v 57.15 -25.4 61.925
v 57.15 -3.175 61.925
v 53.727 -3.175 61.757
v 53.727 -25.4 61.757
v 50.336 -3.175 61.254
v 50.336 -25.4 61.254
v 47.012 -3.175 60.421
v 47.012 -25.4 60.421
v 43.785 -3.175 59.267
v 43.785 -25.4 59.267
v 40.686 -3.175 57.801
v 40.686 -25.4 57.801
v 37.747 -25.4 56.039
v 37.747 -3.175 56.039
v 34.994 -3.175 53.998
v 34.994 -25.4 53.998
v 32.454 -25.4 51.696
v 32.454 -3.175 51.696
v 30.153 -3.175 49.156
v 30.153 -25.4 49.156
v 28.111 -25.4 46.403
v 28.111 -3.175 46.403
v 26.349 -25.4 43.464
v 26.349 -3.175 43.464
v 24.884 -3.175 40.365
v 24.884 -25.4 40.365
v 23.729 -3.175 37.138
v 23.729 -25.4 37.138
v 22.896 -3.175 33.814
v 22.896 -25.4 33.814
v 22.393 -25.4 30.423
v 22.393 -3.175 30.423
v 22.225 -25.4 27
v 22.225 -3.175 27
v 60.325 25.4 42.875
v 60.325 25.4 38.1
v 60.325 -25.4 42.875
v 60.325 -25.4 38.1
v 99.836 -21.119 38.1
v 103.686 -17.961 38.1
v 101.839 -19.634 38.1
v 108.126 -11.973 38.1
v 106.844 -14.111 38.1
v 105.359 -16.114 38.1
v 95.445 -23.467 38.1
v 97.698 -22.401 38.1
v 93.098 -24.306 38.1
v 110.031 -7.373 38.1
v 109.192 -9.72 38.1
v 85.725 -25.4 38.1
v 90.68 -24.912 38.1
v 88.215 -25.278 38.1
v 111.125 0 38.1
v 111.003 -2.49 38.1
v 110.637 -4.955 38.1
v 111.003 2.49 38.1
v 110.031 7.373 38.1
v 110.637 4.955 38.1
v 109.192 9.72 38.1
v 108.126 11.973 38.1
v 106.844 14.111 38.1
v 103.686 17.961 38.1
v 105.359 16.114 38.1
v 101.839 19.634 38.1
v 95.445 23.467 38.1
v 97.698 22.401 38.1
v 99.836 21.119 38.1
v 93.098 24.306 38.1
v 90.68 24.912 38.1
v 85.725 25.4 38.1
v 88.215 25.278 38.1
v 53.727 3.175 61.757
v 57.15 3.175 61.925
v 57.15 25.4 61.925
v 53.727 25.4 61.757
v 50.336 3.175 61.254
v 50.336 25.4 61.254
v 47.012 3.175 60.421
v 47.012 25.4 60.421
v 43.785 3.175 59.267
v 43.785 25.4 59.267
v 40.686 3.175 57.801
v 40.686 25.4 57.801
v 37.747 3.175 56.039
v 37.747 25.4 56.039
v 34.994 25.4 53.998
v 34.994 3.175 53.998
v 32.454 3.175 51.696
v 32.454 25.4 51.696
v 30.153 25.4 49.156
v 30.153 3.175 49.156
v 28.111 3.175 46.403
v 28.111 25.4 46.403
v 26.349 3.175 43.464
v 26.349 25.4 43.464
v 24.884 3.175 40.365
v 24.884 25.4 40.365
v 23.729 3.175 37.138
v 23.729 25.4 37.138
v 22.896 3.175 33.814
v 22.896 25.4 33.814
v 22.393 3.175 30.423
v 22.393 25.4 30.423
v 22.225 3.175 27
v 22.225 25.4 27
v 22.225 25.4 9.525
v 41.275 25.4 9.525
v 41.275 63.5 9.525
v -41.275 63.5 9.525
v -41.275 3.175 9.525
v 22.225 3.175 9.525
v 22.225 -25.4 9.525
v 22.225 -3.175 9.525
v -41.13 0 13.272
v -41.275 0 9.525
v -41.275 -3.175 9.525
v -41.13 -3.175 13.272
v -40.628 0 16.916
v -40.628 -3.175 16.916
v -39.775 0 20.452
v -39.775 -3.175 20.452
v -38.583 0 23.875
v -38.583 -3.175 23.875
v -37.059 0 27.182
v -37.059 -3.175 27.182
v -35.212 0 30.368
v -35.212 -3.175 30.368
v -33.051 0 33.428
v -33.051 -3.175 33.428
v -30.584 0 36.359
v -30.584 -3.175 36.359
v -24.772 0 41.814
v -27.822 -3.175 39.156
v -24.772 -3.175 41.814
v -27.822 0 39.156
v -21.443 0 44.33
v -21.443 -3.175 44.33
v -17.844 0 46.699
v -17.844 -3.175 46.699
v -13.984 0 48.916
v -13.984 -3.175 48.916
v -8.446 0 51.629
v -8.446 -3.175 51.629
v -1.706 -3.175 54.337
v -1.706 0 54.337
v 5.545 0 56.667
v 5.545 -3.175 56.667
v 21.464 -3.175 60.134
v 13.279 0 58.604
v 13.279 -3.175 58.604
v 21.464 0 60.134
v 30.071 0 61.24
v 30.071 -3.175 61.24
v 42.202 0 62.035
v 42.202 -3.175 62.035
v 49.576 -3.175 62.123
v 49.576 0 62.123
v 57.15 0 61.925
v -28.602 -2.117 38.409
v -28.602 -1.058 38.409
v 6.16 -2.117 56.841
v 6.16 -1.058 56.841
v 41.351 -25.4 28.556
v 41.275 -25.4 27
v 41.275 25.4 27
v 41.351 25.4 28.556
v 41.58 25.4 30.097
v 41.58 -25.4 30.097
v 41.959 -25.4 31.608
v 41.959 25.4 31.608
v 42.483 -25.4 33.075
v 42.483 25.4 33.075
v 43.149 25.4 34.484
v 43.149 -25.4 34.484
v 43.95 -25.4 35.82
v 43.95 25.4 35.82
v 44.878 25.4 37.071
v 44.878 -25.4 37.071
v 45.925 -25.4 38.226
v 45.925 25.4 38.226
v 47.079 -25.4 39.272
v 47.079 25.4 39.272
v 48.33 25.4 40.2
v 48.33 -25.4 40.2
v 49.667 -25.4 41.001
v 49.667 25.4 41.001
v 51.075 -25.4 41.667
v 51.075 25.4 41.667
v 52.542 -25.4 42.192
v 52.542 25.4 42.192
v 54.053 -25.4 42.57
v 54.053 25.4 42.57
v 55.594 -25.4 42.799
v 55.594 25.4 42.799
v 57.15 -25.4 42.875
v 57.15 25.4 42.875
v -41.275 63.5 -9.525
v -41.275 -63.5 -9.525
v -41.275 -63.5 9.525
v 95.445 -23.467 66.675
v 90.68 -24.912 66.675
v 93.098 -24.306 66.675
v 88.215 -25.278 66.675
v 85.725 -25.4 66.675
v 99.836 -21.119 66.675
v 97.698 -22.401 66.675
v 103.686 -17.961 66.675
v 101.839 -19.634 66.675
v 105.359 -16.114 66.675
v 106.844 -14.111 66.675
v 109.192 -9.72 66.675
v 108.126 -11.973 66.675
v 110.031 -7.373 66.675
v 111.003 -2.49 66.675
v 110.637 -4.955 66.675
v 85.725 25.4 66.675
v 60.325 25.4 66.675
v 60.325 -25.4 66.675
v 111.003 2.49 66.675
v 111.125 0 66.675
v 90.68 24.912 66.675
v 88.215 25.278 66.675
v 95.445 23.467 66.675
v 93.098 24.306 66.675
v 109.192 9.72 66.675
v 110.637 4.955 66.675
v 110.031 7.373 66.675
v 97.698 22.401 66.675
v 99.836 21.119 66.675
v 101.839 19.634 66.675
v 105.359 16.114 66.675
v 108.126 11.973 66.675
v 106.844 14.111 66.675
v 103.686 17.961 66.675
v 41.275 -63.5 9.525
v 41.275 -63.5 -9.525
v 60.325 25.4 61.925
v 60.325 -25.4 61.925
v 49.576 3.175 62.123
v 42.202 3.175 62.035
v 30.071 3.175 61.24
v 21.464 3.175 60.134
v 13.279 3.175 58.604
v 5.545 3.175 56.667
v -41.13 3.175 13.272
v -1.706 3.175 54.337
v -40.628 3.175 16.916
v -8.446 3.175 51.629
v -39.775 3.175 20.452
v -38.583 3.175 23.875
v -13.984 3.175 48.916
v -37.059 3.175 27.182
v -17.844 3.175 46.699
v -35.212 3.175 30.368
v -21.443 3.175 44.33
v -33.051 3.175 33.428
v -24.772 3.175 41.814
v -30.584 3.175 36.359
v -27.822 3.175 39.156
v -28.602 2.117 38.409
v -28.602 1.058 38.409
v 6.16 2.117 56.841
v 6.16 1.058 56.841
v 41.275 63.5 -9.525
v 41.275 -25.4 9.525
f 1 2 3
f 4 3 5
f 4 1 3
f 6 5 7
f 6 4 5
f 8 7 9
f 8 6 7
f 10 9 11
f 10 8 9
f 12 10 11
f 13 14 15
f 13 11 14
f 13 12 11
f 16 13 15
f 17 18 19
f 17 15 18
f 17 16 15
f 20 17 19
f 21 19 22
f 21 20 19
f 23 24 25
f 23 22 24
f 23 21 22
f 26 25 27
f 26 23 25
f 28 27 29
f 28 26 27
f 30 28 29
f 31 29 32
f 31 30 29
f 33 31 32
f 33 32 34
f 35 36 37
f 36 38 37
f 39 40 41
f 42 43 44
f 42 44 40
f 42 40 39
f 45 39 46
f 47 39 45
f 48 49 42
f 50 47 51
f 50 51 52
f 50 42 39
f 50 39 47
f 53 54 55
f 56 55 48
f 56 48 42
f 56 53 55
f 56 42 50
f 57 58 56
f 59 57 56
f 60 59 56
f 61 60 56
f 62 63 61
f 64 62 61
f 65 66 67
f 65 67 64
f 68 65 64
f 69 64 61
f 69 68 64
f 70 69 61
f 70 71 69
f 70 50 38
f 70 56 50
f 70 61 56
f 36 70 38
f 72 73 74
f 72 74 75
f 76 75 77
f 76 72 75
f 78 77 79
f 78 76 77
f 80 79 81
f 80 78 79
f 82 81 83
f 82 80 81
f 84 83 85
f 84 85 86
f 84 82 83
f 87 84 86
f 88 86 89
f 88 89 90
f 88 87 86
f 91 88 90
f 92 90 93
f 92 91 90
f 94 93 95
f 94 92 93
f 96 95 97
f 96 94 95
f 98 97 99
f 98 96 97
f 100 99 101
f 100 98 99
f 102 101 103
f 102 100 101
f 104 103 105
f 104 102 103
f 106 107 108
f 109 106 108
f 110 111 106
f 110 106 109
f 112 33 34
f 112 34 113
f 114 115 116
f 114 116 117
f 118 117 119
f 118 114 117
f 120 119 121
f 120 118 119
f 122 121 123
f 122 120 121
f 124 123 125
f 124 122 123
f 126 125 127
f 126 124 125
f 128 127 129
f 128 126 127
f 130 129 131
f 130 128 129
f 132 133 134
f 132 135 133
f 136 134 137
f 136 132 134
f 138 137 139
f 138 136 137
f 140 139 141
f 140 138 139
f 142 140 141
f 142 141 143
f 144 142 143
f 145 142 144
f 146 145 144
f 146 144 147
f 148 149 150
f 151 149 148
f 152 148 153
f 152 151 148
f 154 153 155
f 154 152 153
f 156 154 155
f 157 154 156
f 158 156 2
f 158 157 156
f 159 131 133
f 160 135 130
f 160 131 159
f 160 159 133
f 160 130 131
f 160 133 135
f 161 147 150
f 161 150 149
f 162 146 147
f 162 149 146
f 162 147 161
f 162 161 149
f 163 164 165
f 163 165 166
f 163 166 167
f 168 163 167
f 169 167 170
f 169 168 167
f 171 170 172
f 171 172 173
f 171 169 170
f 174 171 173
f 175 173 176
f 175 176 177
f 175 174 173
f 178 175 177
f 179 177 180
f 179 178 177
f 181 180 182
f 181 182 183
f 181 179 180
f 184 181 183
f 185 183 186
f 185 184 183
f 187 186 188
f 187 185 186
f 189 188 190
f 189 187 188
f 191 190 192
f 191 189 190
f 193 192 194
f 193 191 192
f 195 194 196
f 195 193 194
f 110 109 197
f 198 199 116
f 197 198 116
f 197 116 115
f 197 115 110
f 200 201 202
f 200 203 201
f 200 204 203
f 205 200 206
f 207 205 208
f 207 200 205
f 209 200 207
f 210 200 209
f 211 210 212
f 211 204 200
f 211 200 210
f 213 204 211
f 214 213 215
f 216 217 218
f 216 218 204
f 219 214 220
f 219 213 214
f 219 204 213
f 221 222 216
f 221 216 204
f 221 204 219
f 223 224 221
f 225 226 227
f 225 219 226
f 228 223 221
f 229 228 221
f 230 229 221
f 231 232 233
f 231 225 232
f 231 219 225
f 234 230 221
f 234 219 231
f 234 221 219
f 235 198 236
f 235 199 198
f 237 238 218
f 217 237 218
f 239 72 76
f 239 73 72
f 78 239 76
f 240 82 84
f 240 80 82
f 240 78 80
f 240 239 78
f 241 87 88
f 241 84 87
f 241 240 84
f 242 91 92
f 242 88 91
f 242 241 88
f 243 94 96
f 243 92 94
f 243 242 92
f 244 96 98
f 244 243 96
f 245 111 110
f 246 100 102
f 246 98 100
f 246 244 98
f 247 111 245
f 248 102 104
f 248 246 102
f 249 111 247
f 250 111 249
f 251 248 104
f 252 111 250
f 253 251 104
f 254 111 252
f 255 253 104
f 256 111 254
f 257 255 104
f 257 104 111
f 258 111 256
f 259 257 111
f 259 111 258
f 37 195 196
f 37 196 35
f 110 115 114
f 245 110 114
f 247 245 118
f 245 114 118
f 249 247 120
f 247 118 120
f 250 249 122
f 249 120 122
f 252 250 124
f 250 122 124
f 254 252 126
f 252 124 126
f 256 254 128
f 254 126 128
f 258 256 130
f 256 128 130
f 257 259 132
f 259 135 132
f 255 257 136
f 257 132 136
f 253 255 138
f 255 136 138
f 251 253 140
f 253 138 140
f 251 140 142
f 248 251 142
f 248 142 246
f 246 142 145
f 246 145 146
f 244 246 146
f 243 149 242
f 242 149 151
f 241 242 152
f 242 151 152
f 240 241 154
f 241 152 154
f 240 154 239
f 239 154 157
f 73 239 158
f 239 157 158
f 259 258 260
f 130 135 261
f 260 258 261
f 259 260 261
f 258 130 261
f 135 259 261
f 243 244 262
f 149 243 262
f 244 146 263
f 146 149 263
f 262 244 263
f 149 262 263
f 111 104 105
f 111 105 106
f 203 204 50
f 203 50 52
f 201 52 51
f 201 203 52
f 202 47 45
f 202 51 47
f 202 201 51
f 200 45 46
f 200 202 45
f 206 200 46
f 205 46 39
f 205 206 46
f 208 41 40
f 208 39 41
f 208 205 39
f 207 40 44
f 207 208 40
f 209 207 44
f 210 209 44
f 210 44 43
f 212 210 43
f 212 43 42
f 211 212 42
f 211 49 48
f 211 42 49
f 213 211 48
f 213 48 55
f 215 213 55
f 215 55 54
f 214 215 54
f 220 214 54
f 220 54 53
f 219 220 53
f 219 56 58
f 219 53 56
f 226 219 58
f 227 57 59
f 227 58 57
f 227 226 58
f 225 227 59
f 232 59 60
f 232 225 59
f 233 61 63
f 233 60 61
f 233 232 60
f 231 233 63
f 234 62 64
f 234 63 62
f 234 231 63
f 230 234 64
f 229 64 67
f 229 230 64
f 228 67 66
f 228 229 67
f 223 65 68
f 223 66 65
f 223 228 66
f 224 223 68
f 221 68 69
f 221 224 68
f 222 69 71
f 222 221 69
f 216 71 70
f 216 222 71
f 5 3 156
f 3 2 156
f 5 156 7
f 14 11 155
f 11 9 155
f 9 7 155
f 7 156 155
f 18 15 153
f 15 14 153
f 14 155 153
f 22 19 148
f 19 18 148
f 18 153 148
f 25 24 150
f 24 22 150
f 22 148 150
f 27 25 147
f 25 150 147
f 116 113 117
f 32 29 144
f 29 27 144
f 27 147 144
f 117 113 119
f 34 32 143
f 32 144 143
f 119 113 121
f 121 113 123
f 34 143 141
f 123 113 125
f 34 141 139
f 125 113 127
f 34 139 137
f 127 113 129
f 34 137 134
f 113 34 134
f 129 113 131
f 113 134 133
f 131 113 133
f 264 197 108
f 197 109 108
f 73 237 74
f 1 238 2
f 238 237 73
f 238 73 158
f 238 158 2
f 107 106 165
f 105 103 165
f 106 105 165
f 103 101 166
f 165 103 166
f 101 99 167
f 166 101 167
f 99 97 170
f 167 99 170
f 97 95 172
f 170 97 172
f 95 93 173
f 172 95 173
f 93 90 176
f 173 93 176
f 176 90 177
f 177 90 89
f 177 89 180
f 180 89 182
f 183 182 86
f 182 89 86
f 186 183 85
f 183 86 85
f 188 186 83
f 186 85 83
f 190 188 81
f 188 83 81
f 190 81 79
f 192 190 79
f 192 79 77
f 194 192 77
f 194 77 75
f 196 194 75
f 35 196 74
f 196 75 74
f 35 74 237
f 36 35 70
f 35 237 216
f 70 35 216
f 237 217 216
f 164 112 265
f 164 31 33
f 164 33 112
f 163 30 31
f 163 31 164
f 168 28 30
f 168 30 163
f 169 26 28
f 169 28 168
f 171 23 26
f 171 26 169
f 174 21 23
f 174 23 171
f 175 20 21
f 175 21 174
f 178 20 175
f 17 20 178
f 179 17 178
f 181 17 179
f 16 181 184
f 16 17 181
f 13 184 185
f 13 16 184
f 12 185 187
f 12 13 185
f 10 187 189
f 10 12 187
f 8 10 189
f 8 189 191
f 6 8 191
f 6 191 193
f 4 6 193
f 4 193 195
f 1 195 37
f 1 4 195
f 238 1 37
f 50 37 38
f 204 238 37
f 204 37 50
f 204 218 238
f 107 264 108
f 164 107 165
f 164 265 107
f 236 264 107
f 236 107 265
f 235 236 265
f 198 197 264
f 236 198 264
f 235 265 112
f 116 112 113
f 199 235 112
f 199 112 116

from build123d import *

# Parameters (mm, degrees)
F1_DEPTH = 63.5
F0_W     = 25.4
F0_H     = 19.05
F0_H_2   = 4.7498
F0_H_3   = 4.7752
F2_DEPTH = 25.4
F3_DEPTH = 3.175


with BuildPart() as f1:
    # F0 (on Front) → F1 (new body, symmetric)
    with BuildSketch(Plane.XZ):
        Polygon((-41.275, -9.525), (41.275, -9.525), (41.275, 9.525), (22.225, 9.525), (-41.275, 9.525), align=None)
    extrude(amount=F1_DEPTH, both=True)

    # F0 (on Front) → F2 (join, symmetric)
    with BuildSketch(Plane.XZ):
        with BuildLine():
            Line((22.225, 9.525), (41.275, 9.525))
            Line((41.275, 9.525), (41.275, 27.0002))
            ThreePointArc((41.275, 27.0002), (45.9246798487, 38.2255201513), (57.15, 42.8752))
            Line((57.15, 42.8752), (60.325, 42.8752))
            Line((60.325, 42.8752), (60.325, 61.9252))
            Line((60.325, 61.9252), (57.15, 61.9252))
            ThreePointArc((57.15, 61.9252), (32.4542956671, 51.6959043329), (22.225, 27.0002))
            Line((22.225, 27.0002), (22.225, 9.525))
        make_face()
        with Locations((73.025, 52.4002)):
            Rectangle(F0_W, F0_H)
        with Locations((73.025, 64.3001)):
            Rectangle(F0_W, F0_H_2)
        with Locations((73.025, 40.4876)):
            Rectangle(F0_W, F0_H_3)
    extrude(amount=F2_DEPTH, both=True)

    # F0 (on Front) → F3 (join, symmetric)
    with BuildSketch(Plane.XZ):
        with BuildLine():
            add(Edge.make_bspline(
                [(-41.275, 9.525), (-41.6004359722, 42.6694862545), (0, 64.4797682762), (57.15, 61.9252)],
                knots=[0, 0, 0, 0, 111.5045361635, 111.5045361635, 111.5045361635, 111.5045361635], degree=3))
            Line((-41.275, 9.525), (22.225, 9.525))
            Line((22.225, 9.525), (22.225, 27.0002))
            ThreePointArc((22.225, 27.0002), (32.4542956671, 51.6959043329), (57.15, 61.9252))
        make_face()
    extrude(amount=F3_DEPTH, both=True)

    # F0 (on Front) → F4 (revolve)
    with BuildSketch(Plane.XZ):
        Polygon((85.725, 66.675), (85.725, 61.9252), (85.725, 42.8752), (85.725, 38.1), (111.125, 38.1), (111.125, 66.675), align=None)
    revolve(axis=Axis((85.725, 0, 52.3875), (0, 0, 1)))


solid = f1.part
